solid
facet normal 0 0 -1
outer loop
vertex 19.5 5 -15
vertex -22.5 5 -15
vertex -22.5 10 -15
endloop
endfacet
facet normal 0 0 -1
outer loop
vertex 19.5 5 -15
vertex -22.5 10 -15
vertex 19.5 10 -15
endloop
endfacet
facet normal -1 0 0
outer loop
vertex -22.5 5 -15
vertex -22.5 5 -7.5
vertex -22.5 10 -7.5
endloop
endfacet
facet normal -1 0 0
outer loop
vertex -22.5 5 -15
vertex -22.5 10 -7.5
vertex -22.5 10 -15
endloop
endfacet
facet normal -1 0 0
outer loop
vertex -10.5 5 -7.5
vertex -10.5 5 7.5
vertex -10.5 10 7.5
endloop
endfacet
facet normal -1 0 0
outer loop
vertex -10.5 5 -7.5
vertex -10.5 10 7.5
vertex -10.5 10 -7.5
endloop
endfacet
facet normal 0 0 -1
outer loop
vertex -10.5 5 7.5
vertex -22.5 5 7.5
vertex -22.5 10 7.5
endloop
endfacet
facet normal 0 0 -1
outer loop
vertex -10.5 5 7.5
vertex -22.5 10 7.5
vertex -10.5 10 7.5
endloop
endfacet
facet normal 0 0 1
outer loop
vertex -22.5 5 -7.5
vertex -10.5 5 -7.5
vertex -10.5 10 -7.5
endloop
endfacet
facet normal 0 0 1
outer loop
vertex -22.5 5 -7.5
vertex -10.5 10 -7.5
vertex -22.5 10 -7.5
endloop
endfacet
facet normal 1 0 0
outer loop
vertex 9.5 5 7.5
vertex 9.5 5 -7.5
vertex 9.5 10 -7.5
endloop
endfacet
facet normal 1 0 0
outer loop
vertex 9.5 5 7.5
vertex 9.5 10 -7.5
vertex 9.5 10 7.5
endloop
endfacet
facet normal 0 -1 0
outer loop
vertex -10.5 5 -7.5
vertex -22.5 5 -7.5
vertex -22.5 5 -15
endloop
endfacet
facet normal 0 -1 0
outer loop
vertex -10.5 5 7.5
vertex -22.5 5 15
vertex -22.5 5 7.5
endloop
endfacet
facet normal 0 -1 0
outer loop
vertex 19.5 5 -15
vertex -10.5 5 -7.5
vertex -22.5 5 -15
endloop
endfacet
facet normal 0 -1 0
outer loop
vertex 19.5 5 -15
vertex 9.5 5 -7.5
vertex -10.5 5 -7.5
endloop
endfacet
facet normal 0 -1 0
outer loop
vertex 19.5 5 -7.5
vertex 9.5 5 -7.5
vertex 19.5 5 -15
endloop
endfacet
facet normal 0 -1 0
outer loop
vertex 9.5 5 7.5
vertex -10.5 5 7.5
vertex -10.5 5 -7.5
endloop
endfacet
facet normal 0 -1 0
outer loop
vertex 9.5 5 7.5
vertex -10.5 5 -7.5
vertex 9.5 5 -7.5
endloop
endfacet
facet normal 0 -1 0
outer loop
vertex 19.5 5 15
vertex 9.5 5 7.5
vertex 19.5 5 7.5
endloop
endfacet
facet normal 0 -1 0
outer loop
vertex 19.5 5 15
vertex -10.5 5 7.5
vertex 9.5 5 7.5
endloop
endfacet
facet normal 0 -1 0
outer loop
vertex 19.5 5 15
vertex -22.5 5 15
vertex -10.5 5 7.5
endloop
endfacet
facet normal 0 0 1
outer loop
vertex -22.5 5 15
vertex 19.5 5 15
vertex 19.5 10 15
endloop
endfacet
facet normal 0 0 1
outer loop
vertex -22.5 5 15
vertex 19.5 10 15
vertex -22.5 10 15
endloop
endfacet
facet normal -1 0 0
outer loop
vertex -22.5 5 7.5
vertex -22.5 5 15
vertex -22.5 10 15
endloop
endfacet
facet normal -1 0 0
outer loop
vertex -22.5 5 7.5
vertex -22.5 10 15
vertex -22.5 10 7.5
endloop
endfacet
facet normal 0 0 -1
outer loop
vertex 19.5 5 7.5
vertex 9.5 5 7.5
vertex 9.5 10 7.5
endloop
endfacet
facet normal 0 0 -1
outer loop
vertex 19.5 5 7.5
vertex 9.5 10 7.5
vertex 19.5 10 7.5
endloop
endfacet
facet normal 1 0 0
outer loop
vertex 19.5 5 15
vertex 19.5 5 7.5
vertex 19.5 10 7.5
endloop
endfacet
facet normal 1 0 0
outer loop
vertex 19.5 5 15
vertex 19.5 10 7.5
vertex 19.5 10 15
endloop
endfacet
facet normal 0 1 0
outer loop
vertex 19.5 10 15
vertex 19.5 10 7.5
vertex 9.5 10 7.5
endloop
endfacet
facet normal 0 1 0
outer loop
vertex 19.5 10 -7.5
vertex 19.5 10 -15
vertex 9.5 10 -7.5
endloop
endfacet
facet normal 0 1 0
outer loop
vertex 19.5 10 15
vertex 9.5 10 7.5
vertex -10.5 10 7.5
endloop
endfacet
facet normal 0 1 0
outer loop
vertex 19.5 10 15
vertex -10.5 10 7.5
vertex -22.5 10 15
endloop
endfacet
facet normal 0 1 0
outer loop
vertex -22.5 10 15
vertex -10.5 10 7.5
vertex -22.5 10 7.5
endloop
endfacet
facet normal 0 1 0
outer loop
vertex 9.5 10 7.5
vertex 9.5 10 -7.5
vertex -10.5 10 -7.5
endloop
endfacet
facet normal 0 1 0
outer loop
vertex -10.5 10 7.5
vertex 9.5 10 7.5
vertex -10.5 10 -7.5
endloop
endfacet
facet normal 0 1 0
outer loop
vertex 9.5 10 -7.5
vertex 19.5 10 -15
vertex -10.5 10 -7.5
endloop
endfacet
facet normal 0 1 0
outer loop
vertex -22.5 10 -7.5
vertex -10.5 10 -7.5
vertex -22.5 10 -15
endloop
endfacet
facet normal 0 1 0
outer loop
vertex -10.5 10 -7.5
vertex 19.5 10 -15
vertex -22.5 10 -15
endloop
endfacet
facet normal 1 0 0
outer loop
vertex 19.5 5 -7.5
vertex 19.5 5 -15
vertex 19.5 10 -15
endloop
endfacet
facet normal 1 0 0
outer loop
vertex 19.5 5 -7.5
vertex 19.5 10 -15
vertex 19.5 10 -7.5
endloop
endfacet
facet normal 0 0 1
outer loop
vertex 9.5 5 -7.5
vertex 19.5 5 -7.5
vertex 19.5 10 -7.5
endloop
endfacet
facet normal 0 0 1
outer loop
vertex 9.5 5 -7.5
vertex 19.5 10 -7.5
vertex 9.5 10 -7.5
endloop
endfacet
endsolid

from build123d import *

# Parameters (mm, degrees)
SKETCH1_W           = 95
SKETCH1_H           = 30
SKETCH1_R           = 7
SKETCH1_R_2         = 1
BOSS_EXTRUDE1_DEPTH = 5
SKETCH3_W           = 5
SKETCH3_H           = 10
CUT_EXTRUDE2_DEPTH  = 10
SKETCH4_R           = 7
SKETCH4_R_2         = 1
CUT_EXTRUDE3_DEPTH  = 10
FILLET1_R           = 10
CUT_EXTRUDE4_REACH  = 7
SKETCH5_R           = 2.05
BOSS_EXTRUDE2_DEPTH = 5
CUT_EXTRUDE5_DEPTH  = 5


with BuildPart() as part:
    # Sketch1 → Boss-Extrude1 (new body)
    with BuildSketch(Plane(origin=(0, 0, 0), x_dir=(1, 0, 0), z_dir=(0, 1, 0))):
        Rectangle(SKETCH1_W, SKETCH1_H)
        with Locations((-32.5, 0)):
            Circle(SKETCH1_R, mode=Mode.SUBTRACT)
        with Locations((-42.9, 0)):
            Circle(SKETCH1_R_2, mode=Mode.SUBTRACT)
        with Locations((-45.9, 0)):
            Circle(SKETCH1_R_2, mode=Mode.SUBTRACT)
        with Locations((-32.5, 10.4)):
            Circle(SKETCH1_R_2, mode=Mode.SUBTRACT)
        with Locations((-32.5, 13.4)):
            Circle(SKETCH1_R_2, mode=Mode.SUBTRACT)
        with Locations((-22.1, 0)):
            Circle(SKETCH1_R_2, mode=Mode.SUBTRACT)
        with Locations((-19.1, 0)):
            Circle(SKETCH1_R_2, mode=Mode.SUBTRACT)
        with Locations((-32.5, -10.4)):
            Circle(SKETCH1_R_2, mode=Mode.SUBTRACT)
        with Locations((-32.5, -13.4)):
            Circle(SKETCH1_R_2, mode=Mode.SUBTRACT)
    extrude(amount=BOSS_EXTRUDE1_DEPTH)

    # Sketch3 → Cut-Extrude2 (cut)
    with BuildSketch(Plane(origin=(0, 5, 0), x_dir=(1, 0, 0), z_dir=(0, 1, 0))):
        with Locations((-5, 0)):
            Rectangle(SKETCH3_W, SKETCH3_H)
    extrude(amount=-CUT_EXTRUDE2_DEPTH, mode=Mode.SUBTRACT)

    # Sketch4 → Cut-Extrude3 (cut)
    with BuildSketch(Plane(origin=(0, 5, 0), x_dir=(1, 0, 0), z_dir=(0, 1, 0))):
        with Locations((-32.5, 0)):
            Circle(SKETCH4_R)
        with Locations((-32.5, -13.4)):
            Circle(SKETCH4_R_2)
        with Locations((-32.5, -10.4)):
            Circle(SKETCH4_R_2)
        with Locations((-42.9, 0)):
            Circle(SKETCH4_R_2)
        with Locations((-45.9, 0)):
            Circle(SKETCH4_R_2)
        with Locations((-32.5, 13.4)):
            Circle(SKETCH4_R_2)
        with Locations((-22.1, 0)):
            Circle(SKETCH4_R_2)
        with Locations((-19.1, 0)):
            Circle(SKETCH4_R_2)
        with Locations((-32.5, 10.4)):
            Circle(SKETCH4_R_2)
        with Locations((27.5, -13.4)):
            Circle(SKETCH4_R_2)
        with Locations((27.5, -10.4)):
            Circle(SKETCH4_R_2)
        with Locations((40.9, 0)):
            Circle(SKETCH4_R_2)
        with Locations((37.9, 0)):
            Circle(SKETCH4_R_2)
        with Locations((27.5, 0)):
            Circle(SKETCH4_R)
        with Locations((27.5, 10.4)):
            Circle(SKETCH4_R_2)
        with Locations((27.5, 13.4)):
            Circle(SKETCH4_R_2)
        with Locations((17.1, 0)):
            Circle(SKETCH4_R_2)
        with Locations((14.1, 0)):
            Circle(SKETCH4_R_2)
    extrude(amount=-CUT_EXTRUDE3_DEPTH, mode=Mode.SUBTRACT)

    # Fillet1
    fillet1_edges = [part.edges().sort_by_distance(p)[0] for p in [
        (47.5, 2.5, 15),
        (-47.5, 2.5, 15),
        (-47.5, 2.5, -15),
        (47.5, 2.5, -15),
    ]]
    fillet(fillet1_edges, radius=FILLET1_R)

    # Sketch5 → Cut-Extrude4 (cut, up to next)
    with BuildSketch(Plane(origin=(0, 5, 0), x_dir=(1, 0, 0), z_dir=(0, 1, 0)), mode=Mode.PRIVATE) as cut_extrude4_sk1:
        with Locations((-7.5, 5)):
            Circle(SKETCH5_R)
    cut_extrude4_tool1 = extrude(cut_extrude4_sk1.sketch, amount=-CUT_EXTRUDE4_REACH, mode=Mode.PRIVATE) & part.part
    add(cut_extrude4_tool1.solids().sort_by_distance((-7.5, 5, -5))[0], mode=Mode.SUBTRACT)
    # Sketch5 → Cut-Extrude4 (cut, up to next)
    with BuildSketch(Plane(origin=(0, 5, 0), x_dir=(1, 0, 0), z_dir=(0, 1, 0)), mode=Mode.PRIVATE) as cut_extrude4_sk2:
        with Locations((-2.5, 5)):
            Circle(SKETCH5_R)
    cut_extrude4_tool2 = extrude(cut_extrude4_sk2.sketch, amount=-CUT_EXTRUDE4_REACH, mode=Mode.PRIVATE) & part.part
    add(cut_extrude4_tool2.solids().sort_by_distance((-2.5, 5, -5))[0], mode=Mode.SUBTRACT)
    # Sketch5 → Cut-Extrude4 (cut, up to next)
    with BuildSketch(Plane(origin=(0, 5, 0), x_dir=(1, 0, 0), z_dir=(0, 1, 0)), mode=Mode.PRIVATE) as cut_extrude4_sk3:
        with Locations((-2.5, -5)):
            Circle(SKETCH5_R)
    cut_extrude4_tool3 = extrude(cut_extrude4_sk3.sketch, amount=-CUT_EXTRUDE4_REACH, mode=Mode.PRIVATE) & part.part
    add(cut_extrude4_tool3.solids().sort_by_distance((-2.5, 5, 5))[0], mode=Mode.SUBTRACT)
    # Sketch5 → Cut-Extrude4 (cut, up to next)
    with BuildSketch(Plane(origin=(0, 5, 0), x_dir=(1, 0, 0), z_dir=(0, 1, 0)), mode=Mode.PRIVATE) as cut_extrude4_sk4:
        with Locations((-7.5, -5)):
            Circle(SKETCH5_R)
    cut_extrude4_tool4 = extrude(cut_extrude4_sk4.sketch, amount=-CUT_EXTRUDE4_REACH, mode=Mode.PRIVATE) & part.part
    add(cut_extrude4_tool4.solids().sort_by_distance((-7.5, 5, 5))[0], mode=Mode.SUBTRACT)

    # Sketch6 → Boss-Extrude2 (add)
    with BuildSketch(Plane(origin=(0, 5, 0), x_dir=(1, 0, 0), z_dir=(0, 1, 0))):
        Polygon((-22.5, 15), (19.5, 15), (19.5, 7.5), (9.5, 7.5), (9.5, -7.5), (19.5, -7.5), (19.5, -15), (-22.5, -15), (-22.5, -7.5), (-10.5, -7.5), (-10.5, 7.5), (-22.5, 7.5), align=None)
    extrude(amount=BOSS_EXTRUDE2_DEPTH)

    # Sketch8 → Cut-Extrude5 (cut)
    with BuildSketch(Plane.XZ):
        with BuildLine():
            Line((47.5, -5), (47.5, 5))
            ThreePointArc((47.5, 5), (44.571067812, 12.071067812), (37.5, 15))
            Line((37.5, 15), (-37.5, 15))
            ThreePointArc((-37.5, 15), (-44.571067812, 12.071067812), (-47.5, 5))
            Line((-47.5, 5), (-47.5, -5))
            ThreePointArc((-47.5, -5), (-44.571067812, -12.071067812), (-37.5, -15))
            Line((-37.5, -15), (37.5, -15))
            ThreePointArc((37.5, -15), (44.571067812, -12.071067812), (47.5, -5))
        make_face()
    extrude(amount=-CUT_EXTRUDE5_DEPTH, mode=Mode.SUBTRACT)


solid = part.part
